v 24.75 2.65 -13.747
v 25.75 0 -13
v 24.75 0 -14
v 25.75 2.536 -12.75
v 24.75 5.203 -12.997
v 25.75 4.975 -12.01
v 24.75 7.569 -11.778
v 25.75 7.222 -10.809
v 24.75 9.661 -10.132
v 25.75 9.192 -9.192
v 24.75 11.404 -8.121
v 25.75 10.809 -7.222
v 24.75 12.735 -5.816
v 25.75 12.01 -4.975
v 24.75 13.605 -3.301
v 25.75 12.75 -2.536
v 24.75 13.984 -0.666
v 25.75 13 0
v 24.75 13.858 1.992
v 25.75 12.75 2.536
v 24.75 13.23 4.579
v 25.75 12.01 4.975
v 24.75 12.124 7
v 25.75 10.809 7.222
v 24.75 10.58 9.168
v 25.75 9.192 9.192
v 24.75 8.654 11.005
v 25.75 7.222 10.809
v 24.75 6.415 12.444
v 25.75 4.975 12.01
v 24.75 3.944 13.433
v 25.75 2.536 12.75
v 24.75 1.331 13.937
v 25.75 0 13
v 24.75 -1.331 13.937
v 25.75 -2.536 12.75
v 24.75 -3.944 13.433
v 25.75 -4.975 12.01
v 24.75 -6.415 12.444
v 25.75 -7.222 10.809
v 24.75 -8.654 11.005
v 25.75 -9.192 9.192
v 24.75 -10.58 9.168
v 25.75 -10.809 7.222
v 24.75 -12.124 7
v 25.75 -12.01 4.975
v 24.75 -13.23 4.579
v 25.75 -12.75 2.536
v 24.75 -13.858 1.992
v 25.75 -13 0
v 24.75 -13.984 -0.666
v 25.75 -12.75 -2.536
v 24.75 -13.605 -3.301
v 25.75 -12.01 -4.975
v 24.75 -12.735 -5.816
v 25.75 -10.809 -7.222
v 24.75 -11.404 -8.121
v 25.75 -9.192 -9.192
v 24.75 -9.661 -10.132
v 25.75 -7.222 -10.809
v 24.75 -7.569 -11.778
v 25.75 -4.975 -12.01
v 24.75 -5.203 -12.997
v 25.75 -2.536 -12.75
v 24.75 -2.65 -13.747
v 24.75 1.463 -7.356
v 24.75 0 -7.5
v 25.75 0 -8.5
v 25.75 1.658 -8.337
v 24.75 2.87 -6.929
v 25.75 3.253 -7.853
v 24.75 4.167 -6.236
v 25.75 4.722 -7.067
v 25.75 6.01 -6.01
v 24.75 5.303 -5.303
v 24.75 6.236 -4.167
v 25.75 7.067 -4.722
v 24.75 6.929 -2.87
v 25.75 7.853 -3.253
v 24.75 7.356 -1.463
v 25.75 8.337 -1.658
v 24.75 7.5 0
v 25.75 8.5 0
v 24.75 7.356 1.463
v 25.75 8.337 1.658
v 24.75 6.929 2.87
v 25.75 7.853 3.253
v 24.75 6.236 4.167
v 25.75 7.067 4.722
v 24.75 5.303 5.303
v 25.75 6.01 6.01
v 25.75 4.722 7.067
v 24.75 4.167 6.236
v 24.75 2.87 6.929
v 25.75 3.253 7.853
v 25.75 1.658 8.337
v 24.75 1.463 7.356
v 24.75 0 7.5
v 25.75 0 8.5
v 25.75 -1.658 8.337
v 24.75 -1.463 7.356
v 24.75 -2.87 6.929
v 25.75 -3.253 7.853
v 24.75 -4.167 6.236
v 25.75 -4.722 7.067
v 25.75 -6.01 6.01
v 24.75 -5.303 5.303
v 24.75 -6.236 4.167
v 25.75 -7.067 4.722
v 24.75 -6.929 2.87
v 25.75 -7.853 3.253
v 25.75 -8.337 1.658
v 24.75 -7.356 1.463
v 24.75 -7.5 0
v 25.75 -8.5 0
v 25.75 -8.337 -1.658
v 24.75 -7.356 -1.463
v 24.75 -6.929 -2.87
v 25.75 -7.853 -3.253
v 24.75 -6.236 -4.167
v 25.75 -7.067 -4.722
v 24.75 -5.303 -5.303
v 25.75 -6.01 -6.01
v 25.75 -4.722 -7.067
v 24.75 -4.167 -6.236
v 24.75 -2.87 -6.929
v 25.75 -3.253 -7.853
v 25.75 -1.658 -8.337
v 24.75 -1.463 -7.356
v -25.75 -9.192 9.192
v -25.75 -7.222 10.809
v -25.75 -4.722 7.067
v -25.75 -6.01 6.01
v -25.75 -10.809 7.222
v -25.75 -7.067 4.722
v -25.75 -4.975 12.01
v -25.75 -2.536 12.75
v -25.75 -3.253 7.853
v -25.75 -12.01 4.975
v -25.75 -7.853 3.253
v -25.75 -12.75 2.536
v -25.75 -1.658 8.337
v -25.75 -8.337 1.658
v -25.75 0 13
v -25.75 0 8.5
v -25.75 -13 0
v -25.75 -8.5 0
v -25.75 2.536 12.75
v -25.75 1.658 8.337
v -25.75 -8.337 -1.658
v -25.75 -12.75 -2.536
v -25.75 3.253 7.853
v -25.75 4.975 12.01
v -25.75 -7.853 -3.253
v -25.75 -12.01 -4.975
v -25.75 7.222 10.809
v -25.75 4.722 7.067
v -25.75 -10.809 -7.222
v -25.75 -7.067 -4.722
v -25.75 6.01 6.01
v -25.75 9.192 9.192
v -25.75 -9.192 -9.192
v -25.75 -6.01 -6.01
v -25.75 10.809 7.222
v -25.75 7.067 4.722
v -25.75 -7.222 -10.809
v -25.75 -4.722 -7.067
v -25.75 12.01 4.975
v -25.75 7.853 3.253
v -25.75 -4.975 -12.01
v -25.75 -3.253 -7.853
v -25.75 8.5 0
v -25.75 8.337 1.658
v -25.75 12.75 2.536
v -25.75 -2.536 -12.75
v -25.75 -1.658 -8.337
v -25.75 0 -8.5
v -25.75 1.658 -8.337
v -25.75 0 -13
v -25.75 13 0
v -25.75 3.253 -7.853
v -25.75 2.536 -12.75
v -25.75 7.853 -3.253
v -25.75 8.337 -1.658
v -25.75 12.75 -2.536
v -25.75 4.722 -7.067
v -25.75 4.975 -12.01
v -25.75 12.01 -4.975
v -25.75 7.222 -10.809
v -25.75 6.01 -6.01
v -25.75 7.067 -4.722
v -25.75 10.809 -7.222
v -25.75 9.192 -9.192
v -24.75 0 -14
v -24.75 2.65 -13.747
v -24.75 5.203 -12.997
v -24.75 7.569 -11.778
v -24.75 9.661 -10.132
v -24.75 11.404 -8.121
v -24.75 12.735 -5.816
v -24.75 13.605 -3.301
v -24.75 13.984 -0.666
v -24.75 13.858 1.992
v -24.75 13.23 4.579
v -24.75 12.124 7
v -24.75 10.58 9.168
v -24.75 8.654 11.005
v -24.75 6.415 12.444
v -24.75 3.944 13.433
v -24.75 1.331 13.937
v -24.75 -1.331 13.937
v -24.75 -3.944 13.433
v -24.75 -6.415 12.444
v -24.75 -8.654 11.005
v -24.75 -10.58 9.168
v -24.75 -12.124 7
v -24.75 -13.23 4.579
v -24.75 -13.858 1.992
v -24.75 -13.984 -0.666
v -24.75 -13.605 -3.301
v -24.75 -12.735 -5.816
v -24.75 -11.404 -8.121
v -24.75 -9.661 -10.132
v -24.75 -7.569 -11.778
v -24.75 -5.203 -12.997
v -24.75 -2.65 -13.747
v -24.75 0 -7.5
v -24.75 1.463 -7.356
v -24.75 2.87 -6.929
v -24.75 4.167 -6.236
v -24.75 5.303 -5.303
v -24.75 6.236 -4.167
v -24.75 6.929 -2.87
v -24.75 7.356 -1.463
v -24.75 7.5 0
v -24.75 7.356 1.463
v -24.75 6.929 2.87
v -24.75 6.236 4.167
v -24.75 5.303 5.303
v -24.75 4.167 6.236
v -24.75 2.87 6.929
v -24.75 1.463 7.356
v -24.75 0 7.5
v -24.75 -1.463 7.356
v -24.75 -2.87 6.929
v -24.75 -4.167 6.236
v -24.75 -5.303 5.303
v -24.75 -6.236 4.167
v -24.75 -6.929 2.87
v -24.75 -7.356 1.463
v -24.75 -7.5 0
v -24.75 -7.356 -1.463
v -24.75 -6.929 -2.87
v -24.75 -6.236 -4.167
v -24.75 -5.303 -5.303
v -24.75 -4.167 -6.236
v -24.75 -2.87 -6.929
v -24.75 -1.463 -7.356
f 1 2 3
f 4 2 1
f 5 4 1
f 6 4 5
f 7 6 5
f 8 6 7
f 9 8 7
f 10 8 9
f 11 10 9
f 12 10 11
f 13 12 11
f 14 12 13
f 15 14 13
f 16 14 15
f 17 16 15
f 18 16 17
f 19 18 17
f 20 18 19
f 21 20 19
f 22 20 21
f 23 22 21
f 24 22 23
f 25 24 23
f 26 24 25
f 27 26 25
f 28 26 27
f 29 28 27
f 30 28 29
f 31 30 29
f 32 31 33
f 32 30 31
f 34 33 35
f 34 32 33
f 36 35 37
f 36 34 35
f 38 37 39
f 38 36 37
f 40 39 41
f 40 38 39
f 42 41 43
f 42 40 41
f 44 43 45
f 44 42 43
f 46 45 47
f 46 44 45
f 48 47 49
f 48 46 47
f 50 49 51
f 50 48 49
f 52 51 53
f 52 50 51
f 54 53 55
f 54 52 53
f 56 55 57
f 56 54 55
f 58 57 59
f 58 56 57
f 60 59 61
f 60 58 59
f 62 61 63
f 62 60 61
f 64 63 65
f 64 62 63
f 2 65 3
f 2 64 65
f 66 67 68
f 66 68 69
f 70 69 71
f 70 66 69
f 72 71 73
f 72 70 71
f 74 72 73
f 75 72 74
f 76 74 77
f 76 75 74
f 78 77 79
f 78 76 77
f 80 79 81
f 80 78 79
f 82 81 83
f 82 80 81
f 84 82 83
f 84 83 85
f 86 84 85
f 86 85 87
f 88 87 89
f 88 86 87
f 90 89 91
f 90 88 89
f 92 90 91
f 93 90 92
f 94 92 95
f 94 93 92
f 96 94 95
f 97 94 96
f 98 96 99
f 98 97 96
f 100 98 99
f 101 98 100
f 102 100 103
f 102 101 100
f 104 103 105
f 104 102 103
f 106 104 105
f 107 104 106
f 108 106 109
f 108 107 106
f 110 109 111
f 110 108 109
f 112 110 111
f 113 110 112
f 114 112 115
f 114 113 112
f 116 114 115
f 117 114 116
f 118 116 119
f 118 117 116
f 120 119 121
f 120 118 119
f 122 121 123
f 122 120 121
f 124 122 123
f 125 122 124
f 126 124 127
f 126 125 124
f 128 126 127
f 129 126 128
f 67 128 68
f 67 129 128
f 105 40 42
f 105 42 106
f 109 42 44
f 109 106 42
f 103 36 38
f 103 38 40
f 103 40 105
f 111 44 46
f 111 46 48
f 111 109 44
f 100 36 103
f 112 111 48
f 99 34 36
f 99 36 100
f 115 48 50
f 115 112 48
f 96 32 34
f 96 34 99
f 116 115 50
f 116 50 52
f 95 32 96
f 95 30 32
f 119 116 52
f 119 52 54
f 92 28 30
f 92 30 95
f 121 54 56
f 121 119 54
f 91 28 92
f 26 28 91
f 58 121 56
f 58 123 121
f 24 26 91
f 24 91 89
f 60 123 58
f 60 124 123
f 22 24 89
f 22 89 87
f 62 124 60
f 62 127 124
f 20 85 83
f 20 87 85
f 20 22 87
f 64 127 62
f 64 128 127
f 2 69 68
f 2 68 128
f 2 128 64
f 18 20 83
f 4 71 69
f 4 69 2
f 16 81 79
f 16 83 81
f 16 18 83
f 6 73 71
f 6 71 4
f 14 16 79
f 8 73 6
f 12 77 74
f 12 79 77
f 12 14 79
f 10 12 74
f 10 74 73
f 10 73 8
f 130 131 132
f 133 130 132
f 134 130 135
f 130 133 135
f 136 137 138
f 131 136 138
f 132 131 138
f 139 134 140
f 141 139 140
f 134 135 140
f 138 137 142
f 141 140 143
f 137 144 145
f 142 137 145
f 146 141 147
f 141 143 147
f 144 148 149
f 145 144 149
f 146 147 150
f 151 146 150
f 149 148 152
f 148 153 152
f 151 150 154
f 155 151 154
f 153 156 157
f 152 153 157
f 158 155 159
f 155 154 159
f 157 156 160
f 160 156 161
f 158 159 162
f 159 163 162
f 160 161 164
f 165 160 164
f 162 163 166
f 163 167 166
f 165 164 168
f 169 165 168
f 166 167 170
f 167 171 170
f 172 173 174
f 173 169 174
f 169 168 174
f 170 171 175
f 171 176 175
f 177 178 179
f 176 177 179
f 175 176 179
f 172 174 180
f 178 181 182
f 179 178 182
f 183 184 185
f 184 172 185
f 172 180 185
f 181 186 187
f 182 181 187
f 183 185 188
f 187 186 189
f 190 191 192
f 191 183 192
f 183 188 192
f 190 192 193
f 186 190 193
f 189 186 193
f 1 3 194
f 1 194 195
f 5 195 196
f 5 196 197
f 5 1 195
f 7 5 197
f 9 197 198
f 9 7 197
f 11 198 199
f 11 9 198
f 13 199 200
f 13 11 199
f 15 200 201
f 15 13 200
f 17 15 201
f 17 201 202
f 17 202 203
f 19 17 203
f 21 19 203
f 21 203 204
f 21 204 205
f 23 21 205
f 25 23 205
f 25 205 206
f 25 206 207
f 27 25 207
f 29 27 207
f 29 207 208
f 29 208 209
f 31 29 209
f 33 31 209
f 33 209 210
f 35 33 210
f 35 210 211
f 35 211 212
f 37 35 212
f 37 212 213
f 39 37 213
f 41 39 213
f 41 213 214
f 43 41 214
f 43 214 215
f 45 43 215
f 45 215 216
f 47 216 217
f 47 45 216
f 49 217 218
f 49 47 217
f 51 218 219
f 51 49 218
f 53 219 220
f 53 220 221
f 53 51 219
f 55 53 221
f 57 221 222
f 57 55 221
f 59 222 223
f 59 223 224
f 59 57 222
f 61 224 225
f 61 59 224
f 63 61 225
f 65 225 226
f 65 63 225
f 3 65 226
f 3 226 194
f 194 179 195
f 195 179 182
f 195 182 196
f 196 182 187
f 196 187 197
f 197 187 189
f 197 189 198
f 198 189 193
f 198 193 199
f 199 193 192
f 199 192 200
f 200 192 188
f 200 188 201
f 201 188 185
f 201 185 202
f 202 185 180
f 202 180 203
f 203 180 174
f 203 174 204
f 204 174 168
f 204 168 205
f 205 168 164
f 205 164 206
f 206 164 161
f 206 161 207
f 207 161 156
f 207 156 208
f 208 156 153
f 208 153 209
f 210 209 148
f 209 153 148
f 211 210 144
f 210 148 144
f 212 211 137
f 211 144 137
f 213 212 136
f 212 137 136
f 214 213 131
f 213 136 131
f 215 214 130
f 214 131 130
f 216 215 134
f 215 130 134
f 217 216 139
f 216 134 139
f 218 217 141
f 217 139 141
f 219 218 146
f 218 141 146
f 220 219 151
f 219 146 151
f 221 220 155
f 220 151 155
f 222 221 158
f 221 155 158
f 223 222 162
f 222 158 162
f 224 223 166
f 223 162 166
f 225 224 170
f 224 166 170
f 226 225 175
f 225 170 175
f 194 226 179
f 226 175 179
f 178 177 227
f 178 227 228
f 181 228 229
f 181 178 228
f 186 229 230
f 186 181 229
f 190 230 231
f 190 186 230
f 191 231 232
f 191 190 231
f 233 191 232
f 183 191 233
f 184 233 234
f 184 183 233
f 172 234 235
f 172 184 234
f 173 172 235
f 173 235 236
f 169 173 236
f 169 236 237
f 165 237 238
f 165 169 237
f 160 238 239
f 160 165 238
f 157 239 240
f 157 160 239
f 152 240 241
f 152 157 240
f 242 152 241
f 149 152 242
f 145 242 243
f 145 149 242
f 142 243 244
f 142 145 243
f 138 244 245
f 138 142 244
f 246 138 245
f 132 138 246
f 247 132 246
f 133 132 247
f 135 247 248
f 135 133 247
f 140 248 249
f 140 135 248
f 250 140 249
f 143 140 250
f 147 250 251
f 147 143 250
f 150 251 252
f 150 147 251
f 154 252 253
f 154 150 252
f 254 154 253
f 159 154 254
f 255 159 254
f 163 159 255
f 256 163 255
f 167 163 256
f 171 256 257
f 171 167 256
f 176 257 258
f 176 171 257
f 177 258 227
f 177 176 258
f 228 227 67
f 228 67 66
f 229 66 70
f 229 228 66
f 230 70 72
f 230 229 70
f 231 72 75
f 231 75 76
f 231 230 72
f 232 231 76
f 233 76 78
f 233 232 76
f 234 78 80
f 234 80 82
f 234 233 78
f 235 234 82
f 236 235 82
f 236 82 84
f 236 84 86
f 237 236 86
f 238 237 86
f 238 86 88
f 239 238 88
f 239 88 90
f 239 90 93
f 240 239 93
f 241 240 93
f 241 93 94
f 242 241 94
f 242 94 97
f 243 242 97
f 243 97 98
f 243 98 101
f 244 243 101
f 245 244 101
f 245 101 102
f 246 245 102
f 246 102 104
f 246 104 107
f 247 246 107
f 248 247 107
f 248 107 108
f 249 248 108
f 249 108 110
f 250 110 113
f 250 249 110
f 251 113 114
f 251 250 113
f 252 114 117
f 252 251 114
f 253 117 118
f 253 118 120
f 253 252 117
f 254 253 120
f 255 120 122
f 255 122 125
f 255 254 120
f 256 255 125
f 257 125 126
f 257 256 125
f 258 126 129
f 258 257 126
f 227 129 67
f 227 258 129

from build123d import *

# Parameters (mm, degrees)
SKETCH1_R           = 14
SKETCH1_R_2         = 7.5
BOSS_EXTRUDE1_DEPTH = 25.75
CHAMFER1_SIZE       = 1


with BuildPart() as part:
    # Sketch1 → Boss-Extrude1 (new, symmetric)
    with BuildSketch(Plane(origin=(0, 0, 0), x_dir=(0, -1, 0), z_dir=(1, 0, 0))):
        with Locations(Location((0, 0, 0), (0, 0, 90))):
            Circle(SKETCH1_R)
        with Locations(Location((0, 0, 0), (0, 0, 90))):
            Circle(SKETCH1_R_2, mode=Mode.SUBTRACT)
    extrude(amount=BOSS_EXTRUDE1_DEPTH, both=True)

    # Chamfer1
    chamfer1_edges = [part.edges().sort_by_distance(p)[0] for p in [
        (-25.75, 0, 14),
        (25.75, 0, 14),
        (-25.75, 0, 7.5),
        (25.75, 0, 7.5),
    ]]
    chamfer(chamfer1_edges, length=CHAMFER1_SIZE)


solid = part.part
